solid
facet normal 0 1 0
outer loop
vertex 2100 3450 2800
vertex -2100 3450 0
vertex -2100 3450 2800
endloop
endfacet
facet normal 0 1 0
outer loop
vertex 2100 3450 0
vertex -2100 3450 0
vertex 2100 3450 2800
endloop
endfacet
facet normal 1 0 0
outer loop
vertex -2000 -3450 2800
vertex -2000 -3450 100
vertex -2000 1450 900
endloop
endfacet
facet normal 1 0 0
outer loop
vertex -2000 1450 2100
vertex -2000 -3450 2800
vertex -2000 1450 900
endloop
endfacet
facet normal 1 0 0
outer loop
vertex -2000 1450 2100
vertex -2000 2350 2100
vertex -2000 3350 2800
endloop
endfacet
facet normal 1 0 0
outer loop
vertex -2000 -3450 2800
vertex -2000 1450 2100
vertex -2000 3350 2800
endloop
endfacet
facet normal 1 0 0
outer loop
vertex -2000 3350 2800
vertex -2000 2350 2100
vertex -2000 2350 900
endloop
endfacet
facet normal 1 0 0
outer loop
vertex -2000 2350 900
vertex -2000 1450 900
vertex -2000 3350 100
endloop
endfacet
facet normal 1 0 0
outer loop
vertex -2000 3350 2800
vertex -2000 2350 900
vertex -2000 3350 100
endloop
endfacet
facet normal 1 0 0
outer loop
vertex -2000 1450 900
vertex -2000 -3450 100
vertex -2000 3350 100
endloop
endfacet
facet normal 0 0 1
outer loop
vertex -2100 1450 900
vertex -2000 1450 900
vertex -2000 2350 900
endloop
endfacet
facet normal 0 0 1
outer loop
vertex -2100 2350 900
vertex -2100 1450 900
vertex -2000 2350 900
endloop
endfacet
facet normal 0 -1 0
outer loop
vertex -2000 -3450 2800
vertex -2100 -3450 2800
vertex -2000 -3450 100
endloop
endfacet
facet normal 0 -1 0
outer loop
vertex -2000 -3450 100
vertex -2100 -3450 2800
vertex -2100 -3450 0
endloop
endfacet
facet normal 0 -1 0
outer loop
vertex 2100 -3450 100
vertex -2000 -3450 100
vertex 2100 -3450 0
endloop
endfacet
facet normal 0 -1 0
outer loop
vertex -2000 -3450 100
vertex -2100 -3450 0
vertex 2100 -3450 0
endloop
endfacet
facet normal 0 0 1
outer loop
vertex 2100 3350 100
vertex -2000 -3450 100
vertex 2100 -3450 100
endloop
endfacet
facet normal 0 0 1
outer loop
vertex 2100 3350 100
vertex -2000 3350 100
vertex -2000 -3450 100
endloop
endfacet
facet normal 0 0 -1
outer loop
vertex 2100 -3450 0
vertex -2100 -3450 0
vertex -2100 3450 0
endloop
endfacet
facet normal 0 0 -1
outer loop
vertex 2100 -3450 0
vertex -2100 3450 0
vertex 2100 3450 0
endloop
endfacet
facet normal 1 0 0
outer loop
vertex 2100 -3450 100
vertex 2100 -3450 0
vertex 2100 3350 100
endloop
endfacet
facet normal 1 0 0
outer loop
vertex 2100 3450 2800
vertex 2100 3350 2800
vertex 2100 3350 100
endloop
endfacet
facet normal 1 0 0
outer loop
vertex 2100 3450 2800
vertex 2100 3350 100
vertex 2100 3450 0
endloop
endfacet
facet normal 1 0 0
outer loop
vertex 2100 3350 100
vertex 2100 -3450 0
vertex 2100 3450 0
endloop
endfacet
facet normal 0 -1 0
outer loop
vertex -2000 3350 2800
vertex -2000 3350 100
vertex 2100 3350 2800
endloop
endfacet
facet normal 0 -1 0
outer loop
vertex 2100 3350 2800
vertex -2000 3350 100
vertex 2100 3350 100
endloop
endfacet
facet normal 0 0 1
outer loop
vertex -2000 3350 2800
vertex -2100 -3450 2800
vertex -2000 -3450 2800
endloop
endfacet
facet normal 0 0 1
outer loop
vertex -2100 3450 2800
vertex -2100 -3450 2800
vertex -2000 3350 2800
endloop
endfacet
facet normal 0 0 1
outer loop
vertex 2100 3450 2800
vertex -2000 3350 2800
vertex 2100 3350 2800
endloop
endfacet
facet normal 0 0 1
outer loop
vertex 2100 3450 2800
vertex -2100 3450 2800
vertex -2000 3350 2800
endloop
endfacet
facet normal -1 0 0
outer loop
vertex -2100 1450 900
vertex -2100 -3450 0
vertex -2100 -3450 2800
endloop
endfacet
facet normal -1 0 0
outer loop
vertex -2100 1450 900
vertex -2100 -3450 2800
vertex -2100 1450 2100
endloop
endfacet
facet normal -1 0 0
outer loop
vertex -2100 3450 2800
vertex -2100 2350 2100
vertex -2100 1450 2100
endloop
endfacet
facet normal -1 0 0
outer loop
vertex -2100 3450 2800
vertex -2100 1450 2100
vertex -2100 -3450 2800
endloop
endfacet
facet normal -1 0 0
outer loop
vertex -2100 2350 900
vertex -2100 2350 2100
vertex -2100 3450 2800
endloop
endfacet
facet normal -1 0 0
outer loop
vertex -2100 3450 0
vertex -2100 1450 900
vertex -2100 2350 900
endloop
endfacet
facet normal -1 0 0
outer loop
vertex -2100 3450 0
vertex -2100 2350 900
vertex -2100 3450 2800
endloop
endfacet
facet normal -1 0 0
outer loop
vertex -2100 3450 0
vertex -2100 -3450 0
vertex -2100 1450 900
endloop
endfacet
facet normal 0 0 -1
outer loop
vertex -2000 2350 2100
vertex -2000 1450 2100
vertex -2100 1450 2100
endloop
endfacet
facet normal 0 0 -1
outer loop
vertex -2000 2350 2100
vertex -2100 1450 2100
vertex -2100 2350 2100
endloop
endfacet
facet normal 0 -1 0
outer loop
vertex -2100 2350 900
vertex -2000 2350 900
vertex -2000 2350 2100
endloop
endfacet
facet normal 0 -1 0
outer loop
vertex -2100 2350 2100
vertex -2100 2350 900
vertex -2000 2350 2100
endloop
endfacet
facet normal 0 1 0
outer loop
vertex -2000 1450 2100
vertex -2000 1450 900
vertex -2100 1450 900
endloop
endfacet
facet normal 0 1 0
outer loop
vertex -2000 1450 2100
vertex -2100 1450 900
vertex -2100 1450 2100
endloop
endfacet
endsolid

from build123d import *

# Parameters (mm, degrees)
F0_W     = 4200
F0_H     = 6900
F1_DEPTH = 2800
F2_T     = -100
F3_W     = 900
F3_H     = 1200
F4_DEPTH = 100.001


with BuildPart() as f1:
    # F0 (on Top) → F1 (new body)
    with BuildSketch(Plane.XY):
        Rectangle(F0_W, F0_H)
    extrude(amount=F1_DEPTH)

    # F2
    f2_openings = [f1.faces().sort_by_distance(p)[0] for p in [
        (0, 0, 2800),
        (2100, 0, 1400),
        (0, -3450, 1400),
    ]]
    offset(amount=F2_T, openings=f2_openings)

    # F3 (on face) → F4 (cut, through all)
    with BuildSketch(Plane.YZ.offset(-2000)):
        with Locations((1900, 1500)):
            Rectangle(F3_W, F3_H)
    extrude(amount=-F4_DEPTH, mode=Mode.SUBTRACT)


solid = f1.part
